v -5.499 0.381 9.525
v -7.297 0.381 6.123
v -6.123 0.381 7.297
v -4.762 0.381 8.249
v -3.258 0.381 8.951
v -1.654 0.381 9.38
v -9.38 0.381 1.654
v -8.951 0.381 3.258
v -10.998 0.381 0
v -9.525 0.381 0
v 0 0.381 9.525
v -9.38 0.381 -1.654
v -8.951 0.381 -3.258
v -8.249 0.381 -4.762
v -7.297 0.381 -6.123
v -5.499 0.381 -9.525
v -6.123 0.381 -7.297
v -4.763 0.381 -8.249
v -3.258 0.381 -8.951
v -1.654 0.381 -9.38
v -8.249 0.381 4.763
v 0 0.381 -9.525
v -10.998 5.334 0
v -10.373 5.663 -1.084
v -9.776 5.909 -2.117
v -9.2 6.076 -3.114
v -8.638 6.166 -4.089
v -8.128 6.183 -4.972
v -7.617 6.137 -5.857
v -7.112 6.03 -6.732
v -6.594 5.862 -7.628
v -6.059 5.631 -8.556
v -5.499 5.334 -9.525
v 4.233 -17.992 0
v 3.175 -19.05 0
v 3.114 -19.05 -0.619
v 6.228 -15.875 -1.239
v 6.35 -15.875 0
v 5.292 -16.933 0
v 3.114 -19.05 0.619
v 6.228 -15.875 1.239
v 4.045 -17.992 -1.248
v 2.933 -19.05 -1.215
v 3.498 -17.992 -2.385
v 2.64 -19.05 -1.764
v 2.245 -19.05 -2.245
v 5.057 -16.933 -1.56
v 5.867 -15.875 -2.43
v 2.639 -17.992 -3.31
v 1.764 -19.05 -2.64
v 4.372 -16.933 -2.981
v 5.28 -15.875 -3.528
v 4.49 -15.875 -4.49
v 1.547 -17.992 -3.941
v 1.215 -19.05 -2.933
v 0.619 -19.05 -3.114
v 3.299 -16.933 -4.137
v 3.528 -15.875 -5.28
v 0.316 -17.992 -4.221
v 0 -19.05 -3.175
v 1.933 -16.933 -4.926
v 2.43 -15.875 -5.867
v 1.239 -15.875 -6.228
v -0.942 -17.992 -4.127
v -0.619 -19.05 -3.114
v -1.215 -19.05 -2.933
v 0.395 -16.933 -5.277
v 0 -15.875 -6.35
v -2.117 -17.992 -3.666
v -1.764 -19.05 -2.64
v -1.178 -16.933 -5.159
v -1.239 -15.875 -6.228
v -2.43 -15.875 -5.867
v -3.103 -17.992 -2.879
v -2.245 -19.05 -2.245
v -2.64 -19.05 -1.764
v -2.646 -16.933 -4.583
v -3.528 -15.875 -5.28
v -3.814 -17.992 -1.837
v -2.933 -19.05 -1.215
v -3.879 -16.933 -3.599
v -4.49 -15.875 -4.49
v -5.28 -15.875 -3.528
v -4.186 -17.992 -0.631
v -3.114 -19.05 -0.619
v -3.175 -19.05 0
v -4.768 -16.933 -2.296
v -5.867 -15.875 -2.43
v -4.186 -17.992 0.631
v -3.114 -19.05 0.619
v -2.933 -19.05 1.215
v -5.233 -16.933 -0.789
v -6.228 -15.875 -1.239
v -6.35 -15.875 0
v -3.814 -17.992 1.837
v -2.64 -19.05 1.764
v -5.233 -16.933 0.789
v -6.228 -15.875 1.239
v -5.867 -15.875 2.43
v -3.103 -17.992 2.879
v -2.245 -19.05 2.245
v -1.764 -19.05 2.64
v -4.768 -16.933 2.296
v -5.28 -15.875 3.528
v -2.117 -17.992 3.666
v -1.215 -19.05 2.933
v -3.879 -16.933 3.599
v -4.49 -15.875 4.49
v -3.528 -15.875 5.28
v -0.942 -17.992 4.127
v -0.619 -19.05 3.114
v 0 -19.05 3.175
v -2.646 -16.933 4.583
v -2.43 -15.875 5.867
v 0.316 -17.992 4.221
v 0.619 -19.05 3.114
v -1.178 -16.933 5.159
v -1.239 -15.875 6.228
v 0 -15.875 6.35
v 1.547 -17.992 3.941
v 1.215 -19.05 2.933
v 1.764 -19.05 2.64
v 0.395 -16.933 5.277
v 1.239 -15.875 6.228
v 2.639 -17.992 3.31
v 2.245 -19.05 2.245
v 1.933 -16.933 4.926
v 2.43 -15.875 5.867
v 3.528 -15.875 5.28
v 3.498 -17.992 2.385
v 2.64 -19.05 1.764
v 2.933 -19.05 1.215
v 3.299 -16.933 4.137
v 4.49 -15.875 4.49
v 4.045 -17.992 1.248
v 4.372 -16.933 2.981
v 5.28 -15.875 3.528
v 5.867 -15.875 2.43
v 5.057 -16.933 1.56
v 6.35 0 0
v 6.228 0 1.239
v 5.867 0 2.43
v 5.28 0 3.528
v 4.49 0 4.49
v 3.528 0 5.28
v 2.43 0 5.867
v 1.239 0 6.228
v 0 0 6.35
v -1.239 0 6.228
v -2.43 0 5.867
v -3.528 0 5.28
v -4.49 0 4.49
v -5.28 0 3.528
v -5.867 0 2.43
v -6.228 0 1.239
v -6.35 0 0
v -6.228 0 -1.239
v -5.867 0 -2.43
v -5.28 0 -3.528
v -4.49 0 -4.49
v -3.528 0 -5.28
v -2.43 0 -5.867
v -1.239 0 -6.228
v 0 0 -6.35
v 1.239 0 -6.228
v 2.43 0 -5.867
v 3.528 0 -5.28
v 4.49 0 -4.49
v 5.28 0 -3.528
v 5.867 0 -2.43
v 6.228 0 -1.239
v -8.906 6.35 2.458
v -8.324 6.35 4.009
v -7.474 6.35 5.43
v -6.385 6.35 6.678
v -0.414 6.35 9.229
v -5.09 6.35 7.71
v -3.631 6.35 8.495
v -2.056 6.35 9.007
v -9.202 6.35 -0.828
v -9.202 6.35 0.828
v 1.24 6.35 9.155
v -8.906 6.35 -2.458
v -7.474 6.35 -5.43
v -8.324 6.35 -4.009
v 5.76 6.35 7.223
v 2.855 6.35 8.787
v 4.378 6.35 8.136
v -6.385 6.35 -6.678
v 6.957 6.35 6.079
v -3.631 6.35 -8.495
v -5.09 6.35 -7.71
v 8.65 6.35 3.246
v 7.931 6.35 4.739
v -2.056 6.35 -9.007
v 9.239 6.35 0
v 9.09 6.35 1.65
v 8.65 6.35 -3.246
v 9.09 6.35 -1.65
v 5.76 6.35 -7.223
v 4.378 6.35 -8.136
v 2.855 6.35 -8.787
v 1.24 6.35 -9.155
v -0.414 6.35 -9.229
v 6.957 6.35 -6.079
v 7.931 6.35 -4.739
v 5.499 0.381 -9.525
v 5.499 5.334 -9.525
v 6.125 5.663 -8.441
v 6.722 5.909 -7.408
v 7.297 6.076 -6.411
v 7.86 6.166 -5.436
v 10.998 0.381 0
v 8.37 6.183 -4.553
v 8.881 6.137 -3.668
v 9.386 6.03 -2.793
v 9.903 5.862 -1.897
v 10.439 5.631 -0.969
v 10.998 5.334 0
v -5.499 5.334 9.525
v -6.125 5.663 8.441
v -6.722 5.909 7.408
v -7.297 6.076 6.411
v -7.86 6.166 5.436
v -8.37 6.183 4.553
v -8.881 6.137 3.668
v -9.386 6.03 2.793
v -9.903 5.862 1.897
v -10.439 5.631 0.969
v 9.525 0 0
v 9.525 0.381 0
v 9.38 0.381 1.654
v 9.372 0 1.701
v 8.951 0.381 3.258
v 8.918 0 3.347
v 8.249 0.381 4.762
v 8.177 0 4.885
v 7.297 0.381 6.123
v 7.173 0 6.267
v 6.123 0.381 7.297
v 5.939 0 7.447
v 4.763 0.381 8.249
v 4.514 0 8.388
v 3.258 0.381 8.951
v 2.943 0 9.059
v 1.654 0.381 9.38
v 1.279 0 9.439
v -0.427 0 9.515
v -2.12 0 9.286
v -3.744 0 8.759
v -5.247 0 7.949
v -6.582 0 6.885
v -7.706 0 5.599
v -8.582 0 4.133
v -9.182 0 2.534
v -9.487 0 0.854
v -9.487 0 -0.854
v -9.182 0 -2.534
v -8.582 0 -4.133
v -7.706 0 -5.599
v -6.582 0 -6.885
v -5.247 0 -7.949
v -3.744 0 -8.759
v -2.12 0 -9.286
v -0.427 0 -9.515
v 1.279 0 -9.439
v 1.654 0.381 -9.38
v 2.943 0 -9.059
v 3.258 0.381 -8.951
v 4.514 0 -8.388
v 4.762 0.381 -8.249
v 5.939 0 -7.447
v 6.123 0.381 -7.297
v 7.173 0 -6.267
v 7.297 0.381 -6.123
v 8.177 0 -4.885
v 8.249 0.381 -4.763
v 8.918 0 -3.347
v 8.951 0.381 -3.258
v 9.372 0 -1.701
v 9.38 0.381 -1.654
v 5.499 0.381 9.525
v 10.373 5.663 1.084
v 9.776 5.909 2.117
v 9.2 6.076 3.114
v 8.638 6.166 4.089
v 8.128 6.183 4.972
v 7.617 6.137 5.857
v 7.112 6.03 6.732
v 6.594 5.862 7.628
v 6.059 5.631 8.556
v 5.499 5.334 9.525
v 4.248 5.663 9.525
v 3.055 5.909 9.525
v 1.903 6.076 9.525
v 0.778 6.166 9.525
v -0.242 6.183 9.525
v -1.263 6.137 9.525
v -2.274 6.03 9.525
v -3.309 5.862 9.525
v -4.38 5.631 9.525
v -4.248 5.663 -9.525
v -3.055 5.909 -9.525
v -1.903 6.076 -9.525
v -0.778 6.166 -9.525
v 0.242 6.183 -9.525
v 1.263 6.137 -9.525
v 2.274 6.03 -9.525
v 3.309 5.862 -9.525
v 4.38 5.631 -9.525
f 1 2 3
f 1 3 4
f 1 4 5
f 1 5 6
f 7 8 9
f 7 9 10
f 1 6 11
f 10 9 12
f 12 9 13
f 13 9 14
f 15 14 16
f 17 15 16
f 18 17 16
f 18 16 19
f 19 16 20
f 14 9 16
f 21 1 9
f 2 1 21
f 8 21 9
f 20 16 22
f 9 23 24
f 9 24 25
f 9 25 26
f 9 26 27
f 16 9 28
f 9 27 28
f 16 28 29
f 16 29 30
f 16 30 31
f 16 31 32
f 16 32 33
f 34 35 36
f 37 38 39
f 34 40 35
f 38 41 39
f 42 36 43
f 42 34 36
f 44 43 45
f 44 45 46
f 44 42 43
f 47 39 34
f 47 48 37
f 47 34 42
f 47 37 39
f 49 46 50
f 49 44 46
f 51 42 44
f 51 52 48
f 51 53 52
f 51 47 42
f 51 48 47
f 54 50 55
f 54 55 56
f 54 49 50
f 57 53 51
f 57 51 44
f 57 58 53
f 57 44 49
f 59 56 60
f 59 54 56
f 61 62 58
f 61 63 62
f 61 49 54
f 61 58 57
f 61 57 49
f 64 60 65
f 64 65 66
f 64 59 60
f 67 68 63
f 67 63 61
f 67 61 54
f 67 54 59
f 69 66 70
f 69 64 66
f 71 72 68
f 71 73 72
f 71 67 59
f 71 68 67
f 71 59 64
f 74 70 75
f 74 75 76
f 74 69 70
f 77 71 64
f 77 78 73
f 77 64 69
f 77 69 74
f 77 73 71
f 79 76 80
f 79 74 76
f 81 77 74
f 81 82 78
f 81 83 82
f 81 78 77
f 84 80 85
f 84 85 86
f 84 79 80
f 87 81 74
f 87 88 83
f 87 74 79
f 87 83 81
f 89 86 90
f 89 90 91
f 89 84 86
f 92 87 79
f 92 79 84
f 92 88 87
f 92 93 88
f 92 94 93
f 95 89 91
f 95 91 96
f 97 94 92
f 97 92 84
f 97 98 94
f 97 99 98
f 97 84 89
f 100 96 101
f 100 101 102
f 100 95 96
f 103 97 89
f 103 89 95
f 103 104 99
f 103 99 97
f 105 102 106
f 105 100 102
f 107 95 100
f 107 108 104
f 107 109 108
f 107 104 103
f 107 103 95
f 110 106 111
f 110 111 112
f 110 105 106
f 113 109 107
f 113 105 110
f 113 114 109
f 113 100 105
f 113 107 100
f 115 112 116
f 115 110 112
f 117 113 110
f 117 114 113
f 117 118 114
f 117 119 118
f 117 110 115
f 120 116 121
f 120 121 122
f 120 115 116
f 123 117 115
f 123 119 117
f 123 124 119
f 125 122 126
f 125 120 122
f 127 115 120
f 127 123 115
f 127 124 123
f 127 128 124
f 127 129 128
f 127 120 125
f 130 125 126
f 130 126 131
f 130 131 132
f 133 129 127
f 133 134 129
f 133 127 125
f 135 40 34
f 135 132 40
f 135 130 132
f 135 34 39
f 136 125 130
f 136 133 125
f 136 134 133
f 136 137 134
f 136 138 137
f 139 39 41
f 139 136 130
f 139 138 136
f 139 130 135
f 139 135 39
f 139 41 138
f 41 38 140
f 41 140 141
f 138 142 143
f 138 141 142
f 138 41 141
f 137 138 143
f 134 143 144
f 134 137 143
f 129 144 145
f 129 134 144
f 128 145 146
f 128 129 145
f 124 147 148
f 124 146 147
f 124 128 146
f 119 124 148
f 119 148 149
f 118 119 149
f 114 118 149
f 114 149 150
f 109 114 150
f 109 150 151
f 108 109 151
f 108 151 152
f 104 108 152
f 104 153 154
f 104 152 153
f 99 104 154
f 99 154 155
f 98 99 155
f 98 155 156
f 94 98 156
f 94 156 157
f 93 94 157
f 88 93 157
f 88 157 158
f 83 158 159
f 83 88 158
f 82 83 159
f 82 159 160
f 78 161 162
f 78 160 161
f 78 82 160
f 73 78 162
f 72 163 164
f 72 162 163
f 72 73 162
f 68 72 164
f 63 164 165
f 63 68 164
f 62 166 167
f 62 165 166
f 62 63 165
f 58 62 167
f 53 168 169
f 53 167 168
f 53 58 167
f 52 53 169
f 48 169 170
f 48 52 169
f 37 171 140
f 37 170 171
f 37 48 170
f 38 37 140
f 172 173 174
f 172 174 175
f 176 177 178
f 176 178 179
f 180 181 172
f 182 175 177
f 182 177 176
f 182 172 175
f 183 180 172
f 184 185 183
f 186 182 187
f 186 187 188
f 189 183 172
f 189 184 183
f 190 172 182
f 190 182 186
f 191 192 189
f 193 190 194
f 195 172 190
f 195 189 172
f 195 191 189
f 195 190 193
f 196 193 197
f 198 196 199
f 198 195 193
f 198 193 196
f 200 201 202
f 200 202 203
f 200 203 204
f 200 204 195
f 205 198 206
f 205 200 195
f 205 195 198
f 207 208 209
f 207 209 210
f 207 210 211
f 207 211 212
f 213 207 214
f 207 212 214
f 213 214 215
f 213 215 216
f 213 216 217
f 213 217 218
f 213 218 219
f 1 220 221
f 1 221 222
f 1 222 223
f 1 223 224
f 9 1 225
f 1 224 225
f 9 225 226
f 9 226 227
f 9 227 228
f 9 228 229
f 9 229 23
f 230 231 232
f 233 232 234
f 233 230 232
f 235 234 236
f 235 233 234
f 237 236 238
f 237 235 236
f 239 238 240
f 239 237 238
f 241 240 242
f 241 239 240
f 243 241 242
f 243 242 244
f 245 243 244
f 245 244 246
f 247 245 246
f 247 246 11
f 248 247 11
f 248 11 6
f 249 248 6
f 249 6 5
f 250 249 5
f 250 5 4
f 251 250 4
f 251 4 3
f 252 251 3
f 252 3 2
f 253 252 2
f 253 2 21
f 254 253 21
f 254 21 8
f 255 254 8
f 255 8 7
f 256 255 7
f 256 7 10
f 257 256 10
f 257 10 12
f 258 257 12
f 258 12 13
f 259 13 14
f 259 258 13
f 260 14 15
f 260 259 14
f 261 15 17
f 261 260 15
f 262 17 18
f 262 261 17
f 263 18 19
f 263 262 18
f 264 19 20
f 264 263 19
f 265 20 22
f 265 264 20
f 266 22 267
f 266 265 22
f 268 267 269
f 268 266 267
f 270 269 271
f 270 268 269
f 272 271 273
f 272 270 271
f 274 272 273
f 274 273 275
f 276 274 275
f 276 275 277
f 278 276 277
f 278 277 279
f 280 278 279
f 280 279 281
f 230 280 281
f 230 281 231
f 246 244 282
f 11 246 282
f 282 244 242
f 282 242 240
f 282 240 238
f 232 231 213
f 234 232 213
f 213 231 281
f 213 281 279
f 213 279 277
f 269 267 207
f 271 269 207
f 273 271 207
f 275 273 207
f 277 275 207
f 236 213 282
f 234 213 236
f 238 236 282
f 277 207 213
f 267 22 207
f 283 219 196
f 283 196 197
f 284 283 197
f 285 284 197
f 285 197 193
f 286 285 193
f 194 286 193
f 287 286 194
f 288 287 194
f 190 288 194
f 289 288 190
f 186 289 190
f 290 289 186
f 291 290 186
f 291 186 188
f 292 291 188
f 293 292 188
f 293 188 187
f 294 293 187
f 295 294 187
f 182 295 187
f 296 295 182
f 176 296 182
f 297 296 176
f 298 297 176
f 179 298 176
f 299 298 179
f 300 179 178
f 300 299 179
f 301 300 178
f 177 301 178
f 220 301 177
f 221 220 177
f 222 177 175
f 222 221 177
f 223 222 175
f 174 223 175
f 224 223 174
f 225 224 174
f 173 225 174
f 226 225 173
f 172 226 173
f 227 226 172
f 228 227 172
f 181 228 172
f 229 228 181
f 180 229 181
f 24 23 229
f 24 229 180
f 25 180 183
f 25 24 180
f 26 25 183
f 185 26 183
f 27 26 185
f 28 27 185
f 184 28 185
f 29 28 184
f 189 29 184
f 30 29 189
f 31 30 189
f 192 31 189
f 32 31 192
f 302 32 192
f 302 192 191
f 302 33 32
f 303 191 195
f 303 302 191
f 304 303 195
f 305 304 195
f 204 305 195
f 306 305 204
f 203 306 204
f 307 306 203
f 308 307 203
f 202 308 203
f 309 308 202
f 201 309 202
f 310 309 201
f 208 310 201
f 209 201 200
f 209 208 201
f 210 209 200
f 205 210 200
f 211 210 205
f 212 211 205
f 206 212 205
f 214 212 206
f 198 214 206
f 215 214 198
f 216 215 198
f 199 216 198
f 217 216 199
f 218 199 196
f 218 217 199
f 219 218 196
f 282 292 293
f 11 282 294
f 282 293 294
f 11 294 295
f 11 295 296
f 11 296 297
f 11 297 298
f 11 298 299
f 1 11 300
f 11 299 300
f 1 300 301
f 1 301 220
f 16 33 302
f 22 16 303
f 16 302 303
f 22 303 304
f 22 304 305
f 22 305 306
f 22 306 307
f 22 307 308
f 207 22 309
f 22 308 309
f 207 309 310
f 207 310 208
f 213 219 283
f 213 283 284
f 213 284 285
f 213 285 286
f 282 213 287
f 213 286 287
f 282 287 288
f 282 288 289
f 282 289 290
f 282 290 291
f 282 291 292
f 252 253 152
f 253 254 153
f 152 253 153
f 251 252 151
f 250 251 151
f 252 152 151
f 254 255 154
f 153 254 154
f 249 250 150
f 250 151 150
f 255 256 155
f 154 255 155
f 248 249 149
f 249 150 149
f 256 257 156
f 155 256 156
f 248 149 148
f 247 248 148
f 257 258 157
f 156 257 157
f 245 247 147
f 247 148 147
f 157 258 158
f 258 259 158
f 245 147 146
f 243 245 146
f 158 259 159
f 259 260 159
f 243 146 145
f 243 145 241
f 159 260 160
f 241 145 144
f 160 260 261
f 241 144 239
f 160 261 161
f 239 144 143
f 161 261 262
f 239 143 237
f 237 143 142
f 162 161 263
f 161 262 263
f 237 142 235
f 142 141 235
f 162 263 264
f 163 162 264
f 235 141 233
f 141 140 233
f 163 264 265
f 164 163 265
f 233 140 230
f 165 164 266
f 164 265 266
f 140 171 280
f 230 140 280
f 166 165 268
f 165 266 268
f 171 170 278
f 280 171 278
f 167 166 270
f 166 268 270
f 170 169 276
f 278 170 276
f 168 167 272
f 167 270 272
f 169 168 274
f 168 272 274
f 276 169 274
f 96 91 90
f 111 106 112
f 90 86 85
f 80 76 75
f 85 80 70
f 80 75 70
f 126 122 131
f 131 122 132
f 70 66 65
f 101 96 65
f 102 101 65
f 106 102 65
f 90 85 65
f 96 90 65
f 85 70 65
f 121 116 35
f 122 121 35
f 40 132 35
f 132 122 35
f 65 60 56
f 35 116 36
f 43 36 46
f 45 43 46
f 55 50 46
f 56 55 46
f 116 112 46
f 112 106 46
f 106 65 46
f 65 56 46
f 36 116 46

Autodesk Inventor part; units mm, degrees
ref_plane "YZ Plane" through (0, 0, 0) normal (1, 0, 0) x (0, 1, 0)
ref_plane "XZ Plane" through (0, 0, 0) normal (0, 1, 0) x (-1, 0, 0)
ref_plane "XY Plane" through (0, 0, 0) normal (0, 0, 1) x (1, 0, 0)
sketch "Sketch1" plane through (0, 0, 0) normal (0, 0, 1) x (1, 0, 0)
  line L0 (0, 0) -> (6.35, 0)
  line L1 (6.35, 0) -> (6.35, -19.05)
  line L2 (6.35, -19.05) -> (0, -19.05)
  line L3 (0, -19.05) -> (0, 0)
  dimension "d0" = 12.7
  dimension "d1" = 19.05
revolve "Revolution1" add sketch "Sketch1" angle 360 about axis through (0, -19.05, 0) along (0, 1, 0)
chamfer "Chamfer1" distance 3.175 angle 45 1 edges at (-6.35, -19.05, 0)
sketch "Sketch2" plane through (0, 0, 0) normal (0, 1, 0) x (1, 0, 0)
  circle A0 centre (0, 0) radius 9.525
  point P0 (0, 0)
  dimension "d6" = 19.05
extrude "Extrusion1" add sketch "Sketch2" along normal blind 6.35
sketch "Sketch3" plane through (0, 6.35, 0) normal (0, 1, 0) x (1, 0, 0)
  line L0 (10.9985, 0) -> (5.4993, -9.525)
  line L1 (5.4993, -9.525) -> (-5.4993, -9.525)
  line L2 (-5.4993, -9.525) -> (-10.9985, 0)
  line L3 (-10.9985, 0) -> (-5.4993, 9.525)
  line L4 (-5.4993, 9.525) -> (5.4993, 9.525)
  line L5 (5.4993, 9.525) -> (10.9985, 0)
  circle A0 centre (0, 0) radius 9.525 construction
  point P0 (0, 0)
  point P1 (0, 0)
extrude "Extrusion2" add sketch "Sketch3" against normal blind 5.969
sketch "Sketch4" plane through (0, 0, 0) normal (0, 0, 1) x (1, 0, 0)
  line L0 (9.2388, 6.35) -> (10.9985, 6.35)
  line L1 (10.9985, 6.35) -> (10.9985, 5.334)
  line L2 (10.9985, 5.334) -> (9.2388, 6.35)
  line L3 (0, -1.5875) -> (0, 9.525) projected
  line L4 (5.4993, 0) -> (10.9985, 0) construction
  line L5 (5.4993, 6.35) -> (10.9985, 6.35) construction
  line L6 (5.4993, 6.35) -> (5.4993, 0.381) construction
  line L7 (10.9985, 6.35) -> (10.9985, 0.381) construction
  line L8 (10.9985, 6.35) -> (5.4993, 6.35) projected
  line L9 (8.2489, 0.381) -> (10.9985, 0.381) projected
  line L10 (5.4993, 0.381) -> (8.2489, 0.381) projected
  point P0 (0, 0)
  point P1 (16.2522, 7.9375)
  dimension "d11" = 30
  dimension "d17" = 1.016
revolve "Revolution2" cut sketch "Sketch4" angle 360 about axis through (0, -10, 0) along (0, 1, 0)
thread "Thread3" size "1/2-13 UNC" class "2A" standard "ANSI Unified Screw Threads" full length
equation "\"diameter\" = 1.8542"
equation "\"length\" = 19.05"
properties part number "Door Plate Screw" material "Steel, Carbon"
